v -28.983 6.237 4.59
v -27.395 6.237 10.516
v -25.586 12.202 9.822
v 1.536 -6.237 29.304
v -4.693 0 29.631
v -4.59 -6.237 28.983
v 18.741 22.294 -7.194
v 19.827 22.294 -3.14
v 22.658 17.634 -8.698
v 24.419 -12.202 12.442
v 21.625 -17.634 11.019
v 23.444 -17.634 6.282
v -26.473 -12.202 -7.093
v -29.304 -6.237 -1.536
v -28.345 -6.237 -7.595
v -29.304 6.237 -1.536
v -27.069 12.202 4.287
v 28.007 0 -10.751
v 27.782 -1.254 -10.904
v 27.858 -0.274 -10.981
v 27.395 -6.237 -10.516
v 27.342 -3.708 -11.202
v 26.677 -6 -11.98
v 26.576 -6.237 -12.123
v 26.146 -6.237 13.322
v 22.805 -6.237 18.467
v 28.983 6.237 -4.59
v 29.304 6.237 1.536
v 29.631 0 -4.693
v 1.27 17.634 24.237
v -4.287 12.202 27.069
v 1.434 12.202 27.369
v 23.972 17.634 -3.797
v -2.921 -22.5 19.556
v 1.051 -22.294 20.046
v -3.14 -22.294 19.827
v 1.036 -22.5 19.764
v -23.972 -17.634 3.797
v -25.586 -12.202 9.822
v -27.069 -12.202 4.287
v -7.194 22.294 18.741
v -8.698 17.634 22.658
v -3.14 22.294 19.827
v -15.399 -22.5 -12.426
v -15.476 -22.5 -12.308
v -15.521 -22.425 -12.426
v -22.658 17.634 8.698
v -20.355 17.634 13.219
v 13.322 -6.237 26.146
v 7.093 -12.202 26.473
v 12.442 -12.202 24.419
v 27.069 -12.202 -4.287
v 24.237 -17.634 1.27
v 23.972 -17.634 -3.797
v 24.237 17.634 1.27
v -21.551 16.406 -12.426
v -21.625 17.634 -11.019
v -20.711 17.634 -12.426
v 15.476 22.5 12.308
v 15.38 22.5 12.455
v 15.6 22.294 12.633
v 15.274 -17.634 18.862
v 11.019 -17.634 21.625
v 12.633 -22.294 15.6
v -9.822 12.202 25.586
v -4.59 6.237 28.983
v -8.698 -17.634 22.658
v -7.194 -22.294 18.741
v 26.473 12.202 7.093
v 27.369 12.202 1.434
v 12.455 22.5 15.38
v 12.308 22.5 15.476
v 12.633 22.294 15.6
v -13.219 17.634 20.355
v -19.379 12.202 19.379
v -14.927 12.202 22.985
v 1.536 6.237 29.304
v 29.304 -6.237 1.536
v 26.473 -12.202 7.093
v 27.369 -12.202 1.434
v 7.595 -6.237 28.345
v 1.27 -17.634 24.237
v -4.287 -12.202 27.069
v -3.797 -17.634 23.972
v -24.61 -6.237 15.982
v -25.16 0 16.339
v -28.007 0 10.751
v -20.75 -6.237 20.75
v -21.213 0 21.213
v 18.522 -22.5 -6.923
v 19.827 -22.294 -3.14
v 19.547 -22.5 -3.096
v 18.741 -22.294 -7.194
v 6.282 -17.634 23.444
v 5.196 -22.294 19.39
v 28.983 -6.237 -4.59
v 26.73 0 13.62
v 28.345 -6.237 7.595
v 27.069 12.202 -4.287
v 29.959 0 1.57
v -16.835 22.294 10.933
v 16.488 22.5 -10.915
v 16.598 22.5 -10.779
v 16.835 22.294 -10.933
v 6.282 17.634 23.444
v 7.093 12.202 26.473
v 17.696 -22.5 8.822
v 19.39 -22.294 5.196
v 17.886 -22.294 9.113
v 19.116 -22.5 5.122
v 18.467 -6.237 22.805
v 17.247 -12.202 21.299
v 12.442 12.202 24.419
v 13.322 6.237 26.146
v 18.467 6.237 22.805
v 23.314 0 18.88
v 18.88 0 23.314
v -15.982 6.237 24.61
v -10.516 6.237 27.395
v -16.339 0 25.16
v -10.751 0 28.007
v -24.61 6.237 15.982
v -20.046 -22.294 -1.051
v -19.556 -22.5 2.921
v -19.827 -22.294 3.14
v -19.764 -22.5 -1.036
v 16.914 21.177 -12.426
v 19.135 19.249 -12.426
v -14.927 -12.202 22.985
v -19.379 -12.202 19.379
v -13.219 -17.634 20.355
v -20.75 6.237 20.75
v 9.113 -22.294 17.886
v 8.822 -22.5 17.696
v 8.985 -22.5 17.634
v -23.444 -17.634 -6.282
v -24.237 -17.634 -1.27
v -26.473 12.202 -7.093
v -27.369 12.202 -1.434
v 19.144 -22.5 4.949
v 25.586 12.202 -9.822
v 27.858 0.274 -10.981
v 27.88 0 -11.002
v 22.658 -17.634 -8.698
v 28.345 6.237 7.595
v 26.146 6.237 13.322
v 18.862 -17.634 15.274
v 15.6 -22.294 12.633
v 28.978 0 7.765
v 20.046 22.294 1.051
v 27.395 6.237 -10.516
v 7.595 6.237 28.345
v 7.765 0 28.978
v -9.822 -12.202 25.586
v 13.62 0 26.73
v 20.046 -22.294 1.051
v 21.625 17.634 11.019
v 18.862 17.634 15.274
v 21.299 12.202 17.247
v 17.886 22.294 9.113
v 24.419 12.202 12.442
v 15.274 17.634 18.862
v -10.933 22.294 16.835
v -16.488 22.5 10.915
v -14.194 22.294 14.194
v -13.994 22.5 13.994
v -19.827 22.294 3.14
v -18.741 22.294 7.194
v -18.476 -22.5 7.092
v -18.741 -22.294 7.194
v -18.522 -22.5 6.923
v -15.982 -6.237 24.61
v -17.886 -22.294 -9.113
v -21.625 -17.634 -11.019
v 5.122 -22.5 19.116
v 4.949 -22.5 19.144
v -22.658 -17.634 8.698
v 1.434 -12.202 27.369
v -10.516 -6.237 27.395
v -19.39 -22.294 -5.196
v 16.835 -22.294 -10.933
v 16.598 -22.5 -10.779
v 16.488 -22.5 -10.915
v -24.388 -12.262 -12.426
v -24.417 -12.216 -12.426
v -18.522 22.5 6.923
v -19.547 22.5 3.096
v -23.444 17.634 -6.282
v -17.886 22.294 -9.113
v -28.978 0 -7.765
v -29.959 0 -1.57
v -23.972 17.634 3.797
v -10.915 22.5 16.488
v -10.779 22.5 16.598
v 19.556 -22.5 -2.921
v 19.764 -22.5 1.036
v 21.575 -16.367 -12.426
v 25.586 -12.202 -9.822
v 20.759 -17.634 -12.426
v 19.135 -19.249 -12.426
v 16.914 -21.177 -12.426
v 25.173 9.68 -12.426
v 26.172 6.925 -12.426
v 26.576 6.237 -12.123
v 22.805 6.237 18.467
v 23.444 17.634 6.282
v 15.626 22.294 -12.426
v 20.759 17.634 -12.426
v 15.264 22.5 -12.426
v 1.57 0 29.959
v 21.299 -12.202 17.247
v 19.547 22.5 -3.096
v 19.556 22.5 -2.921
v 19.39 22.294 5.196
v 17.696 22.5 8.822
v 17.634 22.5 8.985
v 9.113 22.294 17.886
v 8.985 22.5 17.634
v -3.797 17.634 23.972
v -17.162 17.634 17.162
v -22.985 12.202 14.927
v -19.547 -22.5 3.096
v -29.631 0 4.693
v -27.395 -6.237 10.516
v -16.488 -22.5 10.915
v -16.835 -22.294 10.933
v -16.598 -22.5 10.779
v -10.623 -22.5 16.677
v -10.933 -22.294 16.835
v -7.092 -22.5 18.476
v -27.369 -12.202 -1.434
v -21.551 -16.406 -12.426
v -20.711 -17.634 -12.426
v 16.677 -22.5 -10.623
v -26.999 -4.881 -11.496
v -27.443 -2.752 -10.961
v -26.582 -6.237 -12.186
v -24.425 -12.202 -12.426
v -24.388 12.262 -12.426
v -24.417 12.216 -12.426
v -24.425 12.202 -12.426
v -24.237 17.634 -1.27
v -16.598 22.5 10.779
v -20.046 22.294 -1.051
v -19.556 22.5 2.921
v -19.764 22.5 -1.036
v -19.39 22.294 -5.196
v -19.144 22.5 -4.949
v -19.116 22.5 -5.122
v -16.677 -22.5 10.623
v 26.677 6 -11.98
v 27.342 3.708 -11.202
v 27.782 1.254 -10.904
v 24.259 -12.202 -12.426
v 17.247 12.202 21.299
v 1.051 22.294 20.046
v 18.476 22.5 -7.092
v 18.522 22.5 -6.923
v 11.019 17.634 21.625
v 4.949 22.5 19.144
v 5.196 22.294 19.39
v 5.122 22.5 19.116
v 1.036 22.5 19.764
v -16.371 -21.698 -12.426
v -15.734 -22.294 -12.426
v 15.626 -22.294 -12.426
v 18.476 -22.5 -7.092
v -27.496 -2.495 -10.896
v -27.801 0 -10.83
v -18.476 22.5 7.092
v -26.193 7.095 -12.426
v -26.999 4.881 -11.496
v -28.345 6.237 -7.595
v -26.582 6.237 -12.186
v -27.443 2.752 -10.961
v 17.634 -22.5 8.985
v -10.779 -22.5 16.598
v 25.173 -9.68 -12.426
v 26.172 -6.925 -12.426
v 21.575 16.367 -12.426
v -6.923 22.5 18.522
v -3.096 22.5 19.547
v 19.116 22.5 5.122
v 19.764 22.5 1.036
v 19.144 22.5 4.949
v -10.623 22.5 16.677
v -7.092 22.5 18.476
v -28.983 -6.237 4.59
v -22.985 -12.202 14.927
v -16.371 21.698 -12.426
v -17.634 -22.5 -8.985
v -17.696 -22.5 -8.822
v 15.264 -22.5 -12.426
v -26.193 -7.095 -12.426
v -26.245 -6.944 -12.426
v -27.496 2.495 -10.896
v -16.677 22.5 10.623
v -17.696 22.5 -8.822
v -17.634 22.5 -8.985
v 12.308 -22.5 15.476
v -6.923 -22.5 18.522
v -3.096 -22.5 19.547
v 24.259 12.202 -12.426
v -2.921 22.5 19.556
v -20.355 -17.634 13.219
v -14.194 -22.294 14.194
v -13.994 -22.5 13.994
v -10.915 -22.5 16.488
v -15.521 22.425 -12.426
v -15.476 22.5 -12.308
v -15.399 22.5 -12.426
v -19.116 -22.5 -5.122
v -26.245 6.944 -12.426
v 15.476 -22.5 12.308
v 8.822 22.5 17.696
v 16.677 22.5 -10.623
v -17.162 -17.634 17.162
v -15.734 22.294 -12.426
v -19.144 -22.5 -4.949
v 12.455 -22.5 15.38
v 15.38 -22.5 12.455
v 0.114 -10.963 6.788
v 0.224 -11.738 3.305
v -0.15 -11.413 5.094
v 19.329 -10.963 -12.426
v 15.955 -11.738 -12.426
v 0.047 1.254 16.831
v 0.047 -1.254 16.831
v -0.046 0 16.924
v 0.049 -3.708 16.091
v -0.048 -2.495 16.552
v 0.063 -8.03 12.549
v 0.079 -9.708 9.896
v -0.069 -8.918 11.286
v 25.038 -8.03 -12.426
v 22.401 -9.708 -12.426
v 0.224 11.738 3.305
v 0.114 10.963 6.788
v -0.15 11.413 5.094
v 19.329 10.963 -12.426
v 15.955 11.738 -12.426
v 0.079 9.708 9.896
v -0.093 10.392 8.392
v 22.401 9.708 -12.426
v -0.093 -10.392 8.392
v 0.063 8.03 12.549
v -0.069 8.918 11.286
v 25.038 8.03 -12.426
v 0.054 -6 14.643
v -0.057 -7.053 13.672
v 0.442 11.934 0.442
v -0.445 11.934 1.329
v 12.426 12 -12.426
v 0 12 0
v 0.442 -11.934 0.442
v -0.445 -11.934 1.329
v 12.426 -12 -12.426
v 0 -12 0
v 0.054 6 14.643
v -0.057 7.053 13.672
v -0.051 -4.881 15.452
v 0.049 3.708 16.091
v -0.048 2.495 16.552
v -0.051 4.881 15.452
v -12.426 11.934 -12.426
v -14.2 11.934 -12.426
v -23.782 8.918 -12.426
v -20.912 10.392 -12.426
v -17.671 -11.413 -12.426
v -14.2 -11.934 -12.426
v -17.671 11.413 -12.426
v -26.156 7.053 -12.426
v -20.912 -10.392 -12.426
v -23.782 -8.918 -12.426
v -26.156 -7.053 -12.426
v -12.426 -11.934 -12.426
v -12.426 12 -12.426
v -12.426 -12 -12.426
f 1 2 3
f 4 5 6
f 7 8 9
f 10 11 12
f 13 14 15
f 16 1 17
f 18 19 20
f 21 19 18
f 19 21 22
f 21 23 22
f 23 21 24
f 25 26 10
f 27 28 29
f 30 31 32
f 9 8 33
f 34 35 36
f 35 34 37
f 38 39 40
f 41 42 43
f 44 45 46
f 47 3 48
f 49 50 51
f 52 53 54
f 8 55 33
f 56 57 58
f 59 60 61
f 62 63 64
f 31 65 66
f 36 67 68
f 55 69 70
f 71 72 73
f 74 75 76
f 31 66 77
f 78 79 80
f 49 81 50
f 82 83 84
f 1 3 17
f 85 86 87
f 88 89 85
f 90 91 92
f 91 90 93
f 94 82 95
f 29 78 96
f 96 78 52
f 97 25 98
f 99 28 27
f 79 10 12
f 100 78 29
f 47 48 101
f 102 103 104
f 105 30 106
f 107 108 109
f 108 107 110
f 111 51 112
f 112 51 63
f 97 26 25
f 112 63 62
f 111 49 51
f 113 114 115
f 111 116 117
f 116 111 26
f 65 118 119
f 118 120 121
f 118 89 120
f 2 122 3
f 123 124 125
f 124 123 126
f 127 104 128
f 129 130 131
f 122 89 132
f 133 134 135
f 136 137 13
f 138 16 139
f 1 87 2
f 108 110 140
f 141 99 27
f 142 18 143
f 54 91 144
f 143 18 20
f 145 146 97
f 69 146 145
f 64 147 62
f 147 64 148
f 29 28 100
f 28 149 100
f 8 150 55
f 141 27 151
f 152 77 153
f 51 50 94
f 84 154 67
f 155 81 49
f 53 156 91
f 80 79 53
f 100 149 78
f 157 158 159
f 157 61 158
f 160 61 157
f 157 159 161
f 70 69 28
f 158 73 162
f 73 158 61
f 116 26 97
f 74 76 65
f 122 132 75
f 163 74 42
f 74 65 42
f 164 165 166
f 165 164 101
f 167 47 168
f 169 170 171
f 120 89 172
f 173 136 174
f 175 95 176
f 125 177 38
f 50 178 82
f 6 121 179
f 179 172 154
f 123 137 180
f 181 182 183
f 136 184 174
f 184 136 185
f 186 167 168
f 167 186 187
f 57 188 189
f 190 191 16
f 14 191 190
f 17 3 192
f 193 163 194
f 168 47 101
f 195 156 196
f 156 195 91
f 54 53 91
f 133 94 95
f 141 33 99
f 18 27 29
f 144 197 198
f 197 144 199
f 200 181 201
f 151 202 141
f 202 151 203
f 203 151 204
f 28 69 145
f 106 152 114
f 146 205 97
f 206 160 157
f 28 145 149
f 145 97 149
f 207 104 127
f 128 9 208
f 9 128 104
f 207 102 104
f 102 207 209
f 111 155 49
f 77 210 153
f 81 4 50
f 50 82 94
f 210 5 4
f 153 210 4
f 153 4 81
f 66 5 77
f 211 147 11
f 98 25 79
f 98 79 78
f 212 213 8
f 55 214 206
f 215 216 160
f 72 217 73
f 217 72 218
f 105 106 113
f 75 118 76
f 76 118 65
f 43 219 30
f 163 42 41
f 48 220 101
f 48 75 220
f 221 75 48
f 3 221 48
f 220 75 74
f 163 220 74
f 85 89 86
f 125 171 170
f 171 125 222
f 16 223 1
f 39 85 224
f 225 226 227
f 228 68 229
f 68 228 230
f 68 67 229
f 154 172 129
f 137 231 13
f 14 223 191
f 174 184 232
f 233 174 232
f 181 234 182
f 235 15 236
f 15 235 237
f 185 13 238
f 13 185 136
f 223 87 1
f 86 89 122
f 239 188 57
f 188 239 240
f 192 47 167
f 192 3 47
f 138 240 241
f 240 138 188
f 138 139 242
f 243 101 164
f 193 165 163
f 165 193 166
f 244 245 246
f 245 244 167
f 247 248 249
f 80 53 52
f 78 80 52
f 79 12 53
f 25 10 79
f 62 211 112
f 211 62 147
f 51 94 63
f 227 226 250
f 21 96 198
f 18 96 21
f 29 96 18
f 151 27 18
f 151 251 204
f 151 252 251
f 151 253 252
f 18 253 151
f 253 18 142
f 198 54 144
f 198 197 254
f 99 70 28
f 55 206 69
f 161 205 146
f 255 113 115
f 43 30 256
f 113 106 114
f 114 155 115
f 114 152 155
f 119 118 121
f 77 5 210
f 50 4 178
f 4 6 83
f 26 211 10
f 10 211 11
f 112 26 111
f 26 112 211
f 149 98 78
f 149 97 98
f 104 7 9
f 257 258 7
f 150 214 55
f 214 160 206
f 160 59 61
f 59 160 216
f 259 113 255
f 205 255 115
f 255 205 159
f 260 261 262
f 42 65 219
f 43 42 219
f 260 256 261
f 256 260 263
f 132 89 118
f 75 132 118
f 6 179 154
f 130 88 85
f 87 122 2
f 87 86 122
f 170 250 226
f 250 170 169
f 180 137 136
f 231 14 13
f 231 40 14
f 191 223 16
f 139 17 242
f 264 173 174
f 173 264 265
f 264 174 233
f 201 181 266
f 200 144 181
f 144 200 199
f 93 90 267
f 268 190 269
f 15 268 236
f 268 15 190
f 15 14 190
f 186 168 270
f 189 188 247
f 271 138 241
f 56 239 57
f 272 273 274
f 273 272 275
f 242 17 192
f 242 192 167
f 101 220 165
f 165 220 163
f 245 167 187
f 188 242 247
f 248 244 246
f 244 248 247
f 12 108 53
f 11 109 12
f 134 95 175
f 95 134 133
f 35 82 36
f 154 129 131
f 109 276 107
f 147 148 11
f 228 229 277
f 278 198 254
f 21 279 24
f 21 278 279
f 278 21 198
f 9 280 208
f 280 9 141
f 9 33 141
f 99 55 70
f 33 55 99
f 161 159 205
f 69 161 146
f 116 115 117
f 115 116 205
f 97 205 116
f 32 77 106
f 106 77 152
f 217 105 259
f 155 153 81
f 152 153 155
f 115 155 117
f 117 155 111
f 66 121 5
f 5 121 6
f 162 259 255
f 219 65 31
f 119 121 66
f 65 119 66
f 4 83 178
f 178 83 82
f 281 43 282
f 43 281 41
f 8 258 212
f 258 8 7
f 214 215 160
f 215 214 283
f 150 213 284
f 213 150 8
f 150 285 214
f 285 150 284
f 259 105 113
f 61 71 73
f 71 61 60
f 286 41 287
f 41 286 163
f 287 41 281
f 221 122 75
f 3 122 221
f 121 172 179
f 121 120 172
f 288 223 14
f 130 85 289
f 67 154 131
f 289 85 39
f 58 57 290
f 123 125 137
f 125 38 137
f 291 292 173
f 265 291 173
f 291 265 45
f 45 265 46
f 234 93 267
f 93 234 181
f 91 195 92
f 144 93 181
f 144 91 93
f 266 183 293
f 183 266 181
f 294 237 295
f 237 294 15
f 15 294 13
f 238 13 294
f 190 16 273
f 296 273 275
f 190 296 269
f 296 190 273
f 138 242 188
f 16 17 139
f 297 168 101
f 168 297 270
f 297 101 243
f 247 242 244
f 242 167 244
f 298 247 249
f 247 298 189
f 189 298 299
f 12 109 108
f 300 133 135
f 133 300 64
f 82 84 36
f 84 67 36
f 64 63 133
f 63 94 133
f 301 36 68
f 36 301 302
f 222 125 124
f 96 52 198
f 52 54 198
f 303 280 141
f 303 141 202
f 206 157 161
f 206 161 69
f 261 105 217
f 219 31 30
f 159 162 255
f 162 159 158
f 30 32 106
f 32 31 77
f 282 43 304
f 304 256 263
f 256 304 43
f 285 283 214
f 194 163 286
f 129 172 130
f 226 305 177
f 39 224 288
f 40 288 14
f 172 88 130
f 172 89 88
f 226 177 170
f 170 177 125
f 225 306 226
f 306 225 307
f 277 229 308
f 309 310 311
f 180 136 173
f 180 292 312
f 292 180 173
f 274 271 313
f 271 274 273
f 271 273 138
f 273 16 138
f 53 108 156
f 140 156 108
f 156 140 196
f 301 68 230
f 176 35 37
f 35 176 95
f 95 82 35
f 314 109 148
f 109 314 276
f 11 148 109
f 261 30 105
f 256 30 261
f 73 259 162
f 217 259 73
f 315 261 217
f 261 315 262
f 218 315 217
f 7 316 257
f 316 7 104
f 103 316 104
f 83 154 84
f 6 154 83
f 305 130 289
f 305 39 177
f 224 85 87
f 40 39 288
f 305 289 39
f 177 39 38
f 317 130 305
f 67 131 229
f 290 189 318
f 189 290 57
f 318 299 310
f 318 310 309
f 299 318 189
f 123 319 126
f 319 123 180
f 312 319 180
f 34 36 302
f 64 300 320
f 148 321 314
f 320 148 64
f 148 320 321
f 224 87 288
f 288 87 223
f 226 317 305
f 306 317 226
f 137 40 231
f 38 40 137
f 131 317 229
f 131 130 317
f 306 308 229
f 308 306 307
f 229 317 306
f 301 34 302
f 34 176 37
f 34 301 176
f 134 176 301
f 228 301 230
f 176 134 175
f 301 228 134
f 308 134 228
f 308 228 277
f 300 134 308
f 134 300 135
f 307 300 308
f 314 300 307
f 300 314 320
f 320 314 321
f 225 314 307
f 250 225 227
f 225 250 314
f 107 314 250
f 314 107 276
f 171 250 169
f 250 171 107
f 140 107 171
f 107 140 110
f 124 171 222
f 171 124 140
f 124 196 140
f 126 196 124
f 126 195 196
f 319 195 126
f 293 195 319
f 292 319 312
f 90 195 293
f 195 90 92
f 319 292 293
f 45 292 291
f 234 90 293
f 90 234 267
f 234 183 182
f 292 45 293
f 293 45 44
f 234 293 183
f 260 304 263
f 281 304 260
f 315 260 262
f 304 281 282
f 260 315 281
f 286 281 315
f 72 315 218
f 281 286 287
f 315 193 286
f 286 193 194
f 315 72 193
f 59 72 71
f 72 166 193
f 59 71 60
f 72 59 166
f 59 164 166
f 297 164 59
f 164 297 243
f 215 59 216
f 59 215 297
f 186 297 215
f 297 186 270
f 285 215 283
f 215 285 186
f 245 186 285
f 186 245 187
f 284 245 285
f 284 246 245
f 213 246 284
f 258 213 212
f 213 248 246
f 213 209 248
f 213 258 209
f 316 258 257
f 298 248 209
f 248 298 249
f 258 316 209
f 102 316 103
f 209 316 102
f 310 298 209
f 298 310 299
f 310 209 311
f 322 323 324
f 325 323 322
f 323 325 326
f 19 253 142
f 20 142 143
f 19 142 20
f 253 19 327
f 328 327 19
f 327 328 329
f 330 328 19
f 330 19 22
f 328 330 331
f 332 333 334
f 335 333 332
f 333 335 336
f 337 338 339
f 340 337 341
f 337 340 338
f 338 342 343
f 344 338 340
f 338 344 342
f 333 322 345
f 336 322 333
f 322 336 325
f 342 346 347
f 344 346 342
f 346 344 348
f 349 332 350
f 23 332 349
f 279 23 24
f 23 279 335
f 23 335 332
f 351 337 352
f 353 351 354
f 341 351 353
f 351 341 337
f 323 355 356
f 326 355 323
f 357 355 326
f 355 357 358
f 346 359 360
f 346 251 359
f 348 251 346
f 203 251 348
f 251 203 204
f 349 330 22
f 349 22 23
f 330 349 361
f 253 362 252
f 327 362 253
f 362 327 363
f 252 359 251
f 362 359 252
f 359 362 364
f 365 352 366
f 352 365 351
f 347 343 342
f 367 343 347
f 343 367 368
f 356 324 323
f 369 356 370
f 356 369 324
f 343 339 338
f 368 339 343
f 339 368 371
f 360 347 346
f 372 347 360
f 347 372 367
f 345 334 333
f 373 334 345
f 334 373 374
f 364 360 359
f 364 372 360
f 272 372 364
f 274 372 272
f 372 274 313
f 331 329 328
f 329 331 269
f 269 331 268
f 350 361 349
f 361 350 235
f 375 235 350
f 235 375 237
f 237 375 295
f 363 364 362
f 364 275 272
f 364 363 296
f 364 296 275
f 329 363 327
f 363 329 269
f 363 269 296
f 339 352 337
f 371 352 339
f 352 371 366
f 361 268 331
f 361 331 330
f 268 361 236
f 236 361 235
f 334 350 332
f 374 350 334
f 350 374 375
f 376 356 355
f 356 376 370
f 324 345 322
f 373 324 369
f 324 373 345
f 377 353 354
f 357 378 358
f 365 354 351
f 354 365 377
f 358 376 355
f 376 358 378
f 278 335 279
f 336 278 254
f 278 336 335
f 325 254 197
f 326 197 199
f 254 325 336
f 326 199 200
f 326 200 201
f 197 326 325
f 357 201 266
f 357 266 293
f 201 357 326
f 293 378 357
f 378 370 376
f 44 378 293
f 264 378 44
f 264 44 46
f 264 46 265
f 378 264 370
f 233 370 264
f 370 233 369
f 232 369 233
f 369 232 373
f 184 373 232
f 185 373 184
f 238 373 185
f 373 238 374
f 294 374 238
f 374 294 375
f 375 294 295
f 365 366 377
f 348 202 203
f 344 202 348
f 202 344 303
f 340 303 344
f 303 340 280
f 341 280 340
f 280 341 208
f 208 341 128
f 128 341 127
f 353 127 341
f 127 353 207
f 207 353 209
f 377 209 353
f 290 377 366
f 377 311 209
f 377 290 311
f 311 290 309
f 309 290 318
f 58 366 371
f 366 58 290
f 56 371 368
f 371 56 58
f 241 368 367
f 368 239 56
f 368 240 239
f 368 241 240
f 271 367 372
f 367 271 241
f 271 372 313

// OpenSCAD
// Table corner guards

// Copyright (c) 2015 Jérémie DECOCK <jd.jdhp@gmail.com>

/////////////////////////////////////////////

radius = 30;
table_height = 24;

module table_corner_guards() {

    difference() {
        // sphere(radius);
        intersection() {
            sphere(radius);
            cylinder(r=radius,  h=3/4*2*radius, center=true);
        }
        table_corner();
        translate([radius, radius, 0]) rotate([0,0,45]) cube(radius*2, center=true);
    }
}

module table_corner() {
    table_width = radius + 10;
    table_depth = radius + 10;

    translate([table_width/2, table_depth/2, 0]) cube([table_width, table_depth, table_height], center=true);

    border_radius = table_height/2;
    translate([table_width/2, 0, 0]) rotate([0,90,0]) cylinder(r=border_radius,  h=table_width, center=true);
    translate([0, table_depth/2, 0]) rotate([90,0,0]) cylinder(r=border_radius,  h=table_depth, center=true);
    intersection() {
        translate([table_width/2-border_radius/2, 0, 0]) rotate([0,90,0]) cylinder(r=border_radius,  h=table_width+border_radius, center=true);
        translate([0, table_depth/2-border_radius/2, 0]) rotate([90,0,0]) cylinder(r=border_radius,  h=table_depth+border_radius, center=true);
    }
}

/////////////////////////////////////////////

rotate([-90,0,0]) rotate([0,0,45]) table_corner_guards();
